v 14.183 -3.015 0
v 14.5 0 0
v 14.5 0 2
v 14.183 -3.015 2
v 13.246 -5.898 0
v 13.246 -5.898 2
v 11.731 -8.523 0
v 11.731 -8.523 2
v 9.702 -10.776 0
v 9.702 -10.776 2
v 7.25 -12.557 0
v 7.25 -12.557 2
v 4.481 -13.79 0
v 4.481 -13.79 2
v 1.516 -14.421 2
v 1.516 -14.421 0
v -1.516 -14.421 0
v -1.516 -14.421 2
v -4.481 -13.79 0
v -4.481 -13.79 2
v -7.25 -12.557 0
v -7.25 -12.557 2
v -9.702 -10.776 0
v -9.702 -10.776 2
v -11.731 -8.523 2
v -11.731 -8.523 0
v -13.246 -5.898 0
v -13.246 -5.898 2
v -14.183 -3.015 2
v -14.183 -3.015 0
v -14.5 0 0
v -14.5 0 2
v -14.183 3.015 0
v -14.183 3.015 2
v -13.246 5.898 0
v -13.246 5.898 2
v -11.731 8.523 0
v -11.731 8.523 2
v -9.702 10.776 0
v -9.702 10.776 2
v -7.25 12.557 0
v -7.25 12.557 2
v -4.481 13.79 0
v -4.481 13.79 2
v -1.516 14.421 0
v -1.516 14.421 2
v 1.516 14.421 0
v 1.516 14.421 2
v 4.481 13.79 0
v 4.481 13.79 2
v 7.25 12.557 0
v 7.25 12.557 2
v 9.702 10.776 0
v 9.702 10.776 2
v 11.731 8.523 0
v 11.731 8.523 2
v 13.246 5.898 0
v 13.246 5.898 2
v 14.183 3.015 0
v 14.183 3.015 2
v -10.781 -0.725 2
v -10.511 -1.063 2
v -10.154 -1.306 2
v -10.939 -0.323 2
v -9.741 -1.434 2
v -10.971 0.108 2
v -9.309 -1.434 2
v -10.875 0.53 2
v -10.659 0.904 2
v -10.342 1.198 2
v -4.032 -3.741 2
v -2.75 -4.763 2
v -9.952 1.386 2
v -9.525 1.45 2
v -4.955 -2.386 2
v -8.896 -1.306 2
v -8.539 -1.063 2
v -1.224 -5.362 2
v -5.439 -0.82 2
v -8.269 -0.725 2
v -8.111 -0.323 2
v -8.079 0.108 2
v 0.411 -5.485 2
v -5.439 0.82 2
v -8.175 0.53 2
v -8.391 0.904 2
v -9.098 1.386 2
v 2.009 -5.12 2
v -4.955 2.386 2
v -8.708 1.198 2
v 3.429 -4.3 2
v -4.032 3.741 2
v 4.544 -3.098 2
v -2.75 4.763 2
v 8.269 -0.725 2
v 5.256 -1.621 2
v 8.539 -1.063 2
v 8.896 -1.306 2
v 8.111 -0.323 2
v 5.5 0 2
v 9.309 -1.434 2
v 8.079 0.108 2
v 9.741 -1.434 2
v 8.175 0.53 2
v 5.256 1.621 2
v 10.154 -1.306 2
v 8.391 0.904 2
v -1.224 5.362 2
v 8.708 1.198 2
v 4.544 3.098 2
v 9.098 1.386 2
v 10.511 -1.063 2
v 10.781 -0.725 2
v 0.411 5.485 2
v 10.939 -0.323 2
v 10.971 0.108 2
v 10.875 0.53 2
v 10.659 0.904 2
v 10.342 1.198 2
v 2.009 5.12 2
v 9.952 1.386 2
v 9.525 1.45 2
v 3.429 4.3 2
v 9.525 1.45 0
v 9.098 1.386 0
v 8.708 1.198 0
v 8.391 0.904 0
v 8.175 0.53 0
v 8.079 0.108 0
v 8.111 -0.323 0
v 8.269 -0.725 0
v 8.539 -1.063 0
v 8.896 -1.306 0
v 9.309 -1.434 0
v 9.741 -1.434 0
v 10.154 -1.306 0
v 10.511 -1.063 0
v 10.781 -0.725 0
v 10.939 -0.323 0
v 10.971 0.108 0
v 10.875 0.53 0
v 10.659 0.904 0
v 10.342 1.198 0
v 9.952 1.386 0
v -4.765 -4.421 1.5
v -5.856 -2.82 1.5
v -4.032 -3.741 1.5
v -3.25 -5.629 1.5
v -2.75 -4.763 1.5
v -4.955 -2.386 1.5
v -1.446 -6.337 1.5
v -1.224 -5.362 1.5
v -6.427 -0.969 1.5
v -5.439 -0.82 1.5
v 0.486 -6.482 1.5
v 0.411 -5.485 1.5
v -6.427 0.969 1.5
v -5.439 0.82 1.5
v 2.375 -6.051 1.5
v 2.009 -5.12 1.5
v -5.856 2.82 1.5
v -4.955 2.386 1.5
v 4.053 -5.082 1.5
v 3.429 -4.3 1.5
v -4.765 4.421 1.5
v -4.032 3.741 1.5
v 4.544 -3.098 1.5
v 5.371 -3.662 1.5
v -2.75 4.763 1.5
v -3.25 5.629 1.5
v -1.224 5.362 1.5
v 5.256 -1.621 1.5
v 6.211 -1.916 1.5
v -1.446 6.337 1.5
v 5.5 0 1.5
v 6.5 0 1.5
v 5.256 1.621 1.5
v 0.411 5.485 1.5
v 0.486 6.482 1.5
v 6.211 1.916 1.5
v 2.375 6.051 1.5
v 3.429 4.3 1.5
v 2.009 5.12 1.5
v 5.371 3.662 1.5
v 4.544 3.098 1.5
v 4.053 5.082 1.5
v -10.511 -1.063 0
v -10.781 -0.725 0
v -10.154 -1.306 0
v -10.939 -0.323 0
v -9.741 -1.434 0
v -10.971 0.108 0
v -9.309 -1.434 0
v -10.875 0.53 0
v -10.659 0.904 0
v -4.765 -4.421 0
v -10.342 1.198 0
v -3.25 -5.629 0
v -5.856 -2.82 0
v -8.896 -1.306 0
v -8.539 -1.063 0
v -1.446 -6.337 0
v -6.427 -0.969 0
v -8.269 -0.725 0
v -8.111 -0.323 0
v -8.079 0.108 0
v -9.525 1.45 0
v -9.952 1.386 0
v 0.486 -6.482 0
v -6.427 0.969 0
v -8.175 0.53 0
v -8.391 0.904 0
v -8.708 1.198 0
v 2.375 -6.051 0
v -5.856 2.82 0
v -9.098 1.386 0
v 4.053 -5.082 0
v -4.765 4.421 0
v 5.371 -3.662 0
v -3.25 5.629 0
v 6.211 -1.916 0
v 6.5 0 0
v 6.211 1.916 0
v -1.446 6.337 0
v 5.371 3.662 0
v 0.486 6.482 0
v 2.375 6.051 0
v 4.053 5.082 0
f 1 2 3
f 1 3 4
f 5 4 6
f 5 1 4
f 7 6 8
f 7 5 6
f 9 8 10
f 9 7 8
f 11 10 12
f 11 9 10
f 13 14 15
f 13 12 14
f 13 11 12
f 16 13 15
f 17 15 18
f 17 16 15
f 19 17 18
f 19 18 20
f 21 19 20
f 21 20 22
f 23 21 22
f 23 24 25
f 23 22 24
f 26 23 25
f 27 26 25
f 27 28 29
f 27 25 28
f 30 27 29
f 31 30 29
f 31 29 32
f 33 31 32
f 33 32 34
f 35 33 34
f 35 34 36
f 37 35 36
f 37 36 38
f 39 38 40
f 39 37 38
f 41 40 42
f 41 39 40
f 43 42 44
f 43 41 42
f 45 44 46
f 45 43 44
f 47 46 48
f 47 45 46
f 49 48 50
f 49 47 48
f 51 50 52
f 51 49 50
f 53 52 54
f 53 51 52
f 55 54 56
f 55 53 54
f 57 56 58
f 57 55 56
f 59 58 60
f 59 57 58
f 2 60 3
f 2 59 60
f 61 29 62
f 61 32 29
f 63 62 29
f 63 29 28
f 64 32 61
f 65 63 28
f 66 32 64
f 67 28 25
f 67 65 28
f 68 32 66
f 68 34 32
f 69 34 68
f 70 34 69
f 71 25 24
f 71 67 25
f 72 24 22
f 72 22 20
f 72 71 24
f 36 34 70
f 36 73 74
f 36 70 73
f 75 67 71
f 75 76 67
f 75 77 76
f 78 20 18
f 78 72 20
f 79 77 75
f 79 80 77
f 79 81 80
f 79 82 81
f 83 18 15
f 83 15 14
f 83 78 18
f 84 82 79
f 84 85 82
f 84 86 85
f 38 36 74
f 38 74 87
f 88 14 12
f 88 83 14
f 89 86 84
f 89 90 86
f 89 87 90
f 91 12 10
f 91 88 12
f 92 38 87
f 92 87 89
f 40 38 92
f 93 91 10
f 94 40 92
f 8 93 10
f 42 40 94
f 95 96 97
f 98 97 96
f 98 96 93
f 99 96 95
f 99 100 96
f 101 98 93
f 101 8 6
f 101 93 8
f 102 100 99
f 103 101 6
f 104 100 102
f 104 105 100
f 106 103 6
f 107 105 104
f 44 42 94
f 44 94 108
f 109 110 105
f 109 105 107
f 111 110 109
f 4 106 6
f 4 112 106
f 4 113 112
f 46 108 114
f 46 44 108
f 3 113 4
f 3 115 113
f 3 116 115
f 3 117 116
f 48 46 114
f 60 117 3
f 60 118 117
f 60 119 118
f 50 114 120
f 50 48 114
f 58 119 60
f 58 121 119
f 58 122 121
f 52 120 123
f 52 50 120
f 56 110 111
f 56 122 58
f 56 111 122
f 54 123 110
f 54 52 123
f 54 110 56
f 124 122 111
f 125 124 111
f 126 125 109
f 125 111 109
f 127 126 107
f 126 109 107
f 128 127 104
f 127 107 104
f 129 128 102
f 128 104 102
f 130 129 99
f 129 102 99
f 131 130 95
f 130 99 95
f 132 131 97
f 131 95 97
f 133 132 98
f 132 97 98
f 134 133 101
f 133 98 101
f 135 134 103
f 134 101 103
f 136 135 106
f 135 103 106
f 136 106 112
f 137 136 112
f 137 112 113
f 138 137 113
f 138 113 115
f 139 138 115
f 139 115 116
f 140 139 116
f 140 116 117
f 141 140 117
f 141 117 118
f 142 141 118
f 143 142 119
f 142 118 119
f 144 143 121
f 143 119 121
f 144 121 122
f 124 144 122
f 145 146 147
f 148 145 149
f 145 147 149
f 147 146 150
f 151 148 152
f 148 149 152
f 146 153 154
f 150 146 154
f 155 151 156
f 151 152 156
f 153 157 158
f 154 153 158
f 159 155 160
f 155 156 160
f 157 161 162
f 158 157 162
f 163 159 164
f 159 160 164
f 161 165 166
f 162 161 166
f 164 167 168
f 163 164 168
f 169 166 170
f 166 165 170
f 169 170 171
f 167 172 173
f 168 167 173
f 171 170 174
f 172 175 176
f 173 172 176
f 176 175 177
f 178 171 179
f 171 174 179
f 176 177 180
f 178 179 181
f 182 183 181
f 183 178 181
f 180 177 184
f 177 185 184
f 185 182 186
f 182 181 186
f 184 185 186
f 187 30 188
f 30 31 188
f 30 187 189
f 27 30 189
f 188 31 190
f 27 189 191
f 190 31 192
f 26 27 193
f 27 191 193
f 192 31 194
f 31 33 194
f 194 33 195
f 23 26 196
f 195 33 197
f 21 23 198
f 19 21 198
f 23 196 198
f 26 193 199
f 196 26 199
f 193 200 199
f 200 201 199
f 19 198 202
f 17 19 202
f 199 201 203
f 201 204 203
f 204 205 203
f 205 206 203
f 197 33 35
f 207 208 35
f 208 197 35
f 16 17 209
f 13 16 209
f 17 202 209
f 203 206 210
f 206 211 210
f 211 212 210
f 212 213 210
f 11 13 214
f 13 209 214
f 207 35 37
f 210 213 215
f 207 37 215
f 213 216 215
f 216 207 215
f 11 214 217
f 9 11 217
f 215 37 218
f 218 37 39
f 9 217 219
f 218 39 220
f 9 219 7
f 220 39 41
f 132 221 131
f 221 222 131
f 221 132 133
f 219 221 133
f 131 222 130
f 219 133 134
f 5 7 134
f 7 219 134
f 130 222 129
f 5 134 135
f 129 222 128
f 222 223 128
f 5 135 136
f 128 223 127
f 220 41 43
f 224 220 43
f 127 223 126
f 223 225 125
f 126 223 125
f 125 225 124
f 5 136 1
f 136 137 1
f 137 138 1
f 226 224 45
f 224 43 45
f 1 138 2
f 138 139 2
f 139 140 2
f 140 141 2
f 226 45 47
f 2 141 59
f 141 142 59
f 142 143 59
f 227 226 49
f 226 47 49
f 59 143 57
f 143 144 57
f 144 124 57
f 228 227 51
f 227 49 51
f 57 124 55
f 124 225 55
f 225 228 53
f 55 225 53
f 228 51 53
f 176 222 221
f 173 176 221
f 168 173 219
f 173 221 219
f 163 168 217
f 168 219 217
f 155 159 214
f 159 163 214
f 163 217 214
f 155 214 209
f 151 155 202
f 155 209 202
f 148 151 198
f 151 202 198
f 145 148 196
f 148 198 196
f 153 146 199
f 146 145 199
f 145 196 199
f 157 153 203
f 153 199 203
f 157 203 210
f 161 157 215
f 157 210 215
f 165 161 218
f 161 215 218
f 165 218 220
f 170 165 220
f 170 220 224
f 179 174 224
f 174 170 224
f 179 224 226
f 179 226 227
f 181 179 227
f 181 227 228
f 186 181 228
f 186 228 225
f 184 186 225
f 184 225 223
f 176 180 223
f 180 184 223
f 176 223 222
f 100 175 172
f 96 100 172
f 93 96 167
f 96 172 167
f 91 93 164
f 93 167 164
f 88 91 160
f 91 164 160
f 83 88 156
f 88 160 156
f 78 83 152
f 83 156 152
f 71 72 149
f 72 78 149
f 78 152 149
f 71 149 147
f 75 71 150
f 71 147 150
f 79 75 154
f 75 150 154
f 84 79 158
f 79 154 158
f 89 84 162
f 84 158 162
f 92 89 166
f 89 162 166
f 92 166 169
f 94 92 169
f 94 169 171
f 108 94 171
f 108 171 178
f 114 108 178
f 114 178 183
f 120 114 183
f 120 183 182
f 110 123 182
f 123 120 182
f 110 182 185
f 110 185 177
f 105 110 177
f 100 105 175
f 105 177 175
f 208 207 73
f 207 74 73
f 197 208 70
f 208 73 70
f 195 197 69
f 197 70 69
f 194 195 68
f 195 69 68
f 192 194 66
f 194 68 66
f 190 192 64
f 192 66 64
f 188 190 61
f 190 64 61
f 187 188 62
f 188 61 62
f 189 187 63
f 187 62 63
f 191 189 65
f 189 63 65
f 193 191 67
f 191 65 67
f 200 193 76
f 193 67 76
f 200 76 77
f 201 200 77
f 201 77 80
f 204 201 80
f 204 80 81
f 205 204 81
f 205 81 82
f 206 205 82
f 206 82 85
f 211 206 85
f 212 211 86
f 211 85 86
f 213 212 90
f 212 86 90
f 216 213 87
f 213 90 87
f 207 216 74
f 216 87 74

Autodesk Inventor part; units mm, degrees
ref_plane "YZ Plane" through (0, 0, 0) normal (1, 0, 0) x (0, 1, 0)
ref_plane "XZ Plane" through (0, 0, 0) normal (0, 1, 0) x (-1, 0, 0)
ref_plane "XY Plane" through (0, 0, 0) normal (0, 0, 1) x (1, 0, 0)
sketch "Skizze1" plane through (0, 0, 0) normal (0, 0, 1) x (1, 0, 0)
  circle A0 centre (0, 0) radius 14.5
  circle A1 centre (0, 0) radius 9.525 construction
  circle A2 centre (0, 0) radius 5.5
  circle A3 centre (0, 0) radius 6.5
  line L0 (-9.525, 0) -> (9.525, 0) construction
  circle A4 centre (0, 0) radius 10.45 construction
  line L1 (0, 0) -> (0, 10.45) construction
  point P0 (-9.05, -5.225)
  point P1 (9.05, -5.225)
  dimension "d15" = 20.9
  dimension "d0" = 29
  dimension "d1" = 19.05
  dimension "d2" = 11
  dimension "d3" = 13
  dimension "d18" = 360
extrude "Extrusion1" add sketch "Skizze1" along normal blind 2 contours A0 | A3
extrude "Extrusion2" cut sketch "Skizze1" along normal blind 1.5 contours A3
hole "Bohrung1" at (-9.525, 0, 0) at (9.525, 0, 0) direction (0, 0, 1) diameter 2.9 end through all clearance for "Inbusschraube DIN EN ISO 4762" size "M2.5" standard "DIN"
properties part number "Sensor_AbstandFlansch"
